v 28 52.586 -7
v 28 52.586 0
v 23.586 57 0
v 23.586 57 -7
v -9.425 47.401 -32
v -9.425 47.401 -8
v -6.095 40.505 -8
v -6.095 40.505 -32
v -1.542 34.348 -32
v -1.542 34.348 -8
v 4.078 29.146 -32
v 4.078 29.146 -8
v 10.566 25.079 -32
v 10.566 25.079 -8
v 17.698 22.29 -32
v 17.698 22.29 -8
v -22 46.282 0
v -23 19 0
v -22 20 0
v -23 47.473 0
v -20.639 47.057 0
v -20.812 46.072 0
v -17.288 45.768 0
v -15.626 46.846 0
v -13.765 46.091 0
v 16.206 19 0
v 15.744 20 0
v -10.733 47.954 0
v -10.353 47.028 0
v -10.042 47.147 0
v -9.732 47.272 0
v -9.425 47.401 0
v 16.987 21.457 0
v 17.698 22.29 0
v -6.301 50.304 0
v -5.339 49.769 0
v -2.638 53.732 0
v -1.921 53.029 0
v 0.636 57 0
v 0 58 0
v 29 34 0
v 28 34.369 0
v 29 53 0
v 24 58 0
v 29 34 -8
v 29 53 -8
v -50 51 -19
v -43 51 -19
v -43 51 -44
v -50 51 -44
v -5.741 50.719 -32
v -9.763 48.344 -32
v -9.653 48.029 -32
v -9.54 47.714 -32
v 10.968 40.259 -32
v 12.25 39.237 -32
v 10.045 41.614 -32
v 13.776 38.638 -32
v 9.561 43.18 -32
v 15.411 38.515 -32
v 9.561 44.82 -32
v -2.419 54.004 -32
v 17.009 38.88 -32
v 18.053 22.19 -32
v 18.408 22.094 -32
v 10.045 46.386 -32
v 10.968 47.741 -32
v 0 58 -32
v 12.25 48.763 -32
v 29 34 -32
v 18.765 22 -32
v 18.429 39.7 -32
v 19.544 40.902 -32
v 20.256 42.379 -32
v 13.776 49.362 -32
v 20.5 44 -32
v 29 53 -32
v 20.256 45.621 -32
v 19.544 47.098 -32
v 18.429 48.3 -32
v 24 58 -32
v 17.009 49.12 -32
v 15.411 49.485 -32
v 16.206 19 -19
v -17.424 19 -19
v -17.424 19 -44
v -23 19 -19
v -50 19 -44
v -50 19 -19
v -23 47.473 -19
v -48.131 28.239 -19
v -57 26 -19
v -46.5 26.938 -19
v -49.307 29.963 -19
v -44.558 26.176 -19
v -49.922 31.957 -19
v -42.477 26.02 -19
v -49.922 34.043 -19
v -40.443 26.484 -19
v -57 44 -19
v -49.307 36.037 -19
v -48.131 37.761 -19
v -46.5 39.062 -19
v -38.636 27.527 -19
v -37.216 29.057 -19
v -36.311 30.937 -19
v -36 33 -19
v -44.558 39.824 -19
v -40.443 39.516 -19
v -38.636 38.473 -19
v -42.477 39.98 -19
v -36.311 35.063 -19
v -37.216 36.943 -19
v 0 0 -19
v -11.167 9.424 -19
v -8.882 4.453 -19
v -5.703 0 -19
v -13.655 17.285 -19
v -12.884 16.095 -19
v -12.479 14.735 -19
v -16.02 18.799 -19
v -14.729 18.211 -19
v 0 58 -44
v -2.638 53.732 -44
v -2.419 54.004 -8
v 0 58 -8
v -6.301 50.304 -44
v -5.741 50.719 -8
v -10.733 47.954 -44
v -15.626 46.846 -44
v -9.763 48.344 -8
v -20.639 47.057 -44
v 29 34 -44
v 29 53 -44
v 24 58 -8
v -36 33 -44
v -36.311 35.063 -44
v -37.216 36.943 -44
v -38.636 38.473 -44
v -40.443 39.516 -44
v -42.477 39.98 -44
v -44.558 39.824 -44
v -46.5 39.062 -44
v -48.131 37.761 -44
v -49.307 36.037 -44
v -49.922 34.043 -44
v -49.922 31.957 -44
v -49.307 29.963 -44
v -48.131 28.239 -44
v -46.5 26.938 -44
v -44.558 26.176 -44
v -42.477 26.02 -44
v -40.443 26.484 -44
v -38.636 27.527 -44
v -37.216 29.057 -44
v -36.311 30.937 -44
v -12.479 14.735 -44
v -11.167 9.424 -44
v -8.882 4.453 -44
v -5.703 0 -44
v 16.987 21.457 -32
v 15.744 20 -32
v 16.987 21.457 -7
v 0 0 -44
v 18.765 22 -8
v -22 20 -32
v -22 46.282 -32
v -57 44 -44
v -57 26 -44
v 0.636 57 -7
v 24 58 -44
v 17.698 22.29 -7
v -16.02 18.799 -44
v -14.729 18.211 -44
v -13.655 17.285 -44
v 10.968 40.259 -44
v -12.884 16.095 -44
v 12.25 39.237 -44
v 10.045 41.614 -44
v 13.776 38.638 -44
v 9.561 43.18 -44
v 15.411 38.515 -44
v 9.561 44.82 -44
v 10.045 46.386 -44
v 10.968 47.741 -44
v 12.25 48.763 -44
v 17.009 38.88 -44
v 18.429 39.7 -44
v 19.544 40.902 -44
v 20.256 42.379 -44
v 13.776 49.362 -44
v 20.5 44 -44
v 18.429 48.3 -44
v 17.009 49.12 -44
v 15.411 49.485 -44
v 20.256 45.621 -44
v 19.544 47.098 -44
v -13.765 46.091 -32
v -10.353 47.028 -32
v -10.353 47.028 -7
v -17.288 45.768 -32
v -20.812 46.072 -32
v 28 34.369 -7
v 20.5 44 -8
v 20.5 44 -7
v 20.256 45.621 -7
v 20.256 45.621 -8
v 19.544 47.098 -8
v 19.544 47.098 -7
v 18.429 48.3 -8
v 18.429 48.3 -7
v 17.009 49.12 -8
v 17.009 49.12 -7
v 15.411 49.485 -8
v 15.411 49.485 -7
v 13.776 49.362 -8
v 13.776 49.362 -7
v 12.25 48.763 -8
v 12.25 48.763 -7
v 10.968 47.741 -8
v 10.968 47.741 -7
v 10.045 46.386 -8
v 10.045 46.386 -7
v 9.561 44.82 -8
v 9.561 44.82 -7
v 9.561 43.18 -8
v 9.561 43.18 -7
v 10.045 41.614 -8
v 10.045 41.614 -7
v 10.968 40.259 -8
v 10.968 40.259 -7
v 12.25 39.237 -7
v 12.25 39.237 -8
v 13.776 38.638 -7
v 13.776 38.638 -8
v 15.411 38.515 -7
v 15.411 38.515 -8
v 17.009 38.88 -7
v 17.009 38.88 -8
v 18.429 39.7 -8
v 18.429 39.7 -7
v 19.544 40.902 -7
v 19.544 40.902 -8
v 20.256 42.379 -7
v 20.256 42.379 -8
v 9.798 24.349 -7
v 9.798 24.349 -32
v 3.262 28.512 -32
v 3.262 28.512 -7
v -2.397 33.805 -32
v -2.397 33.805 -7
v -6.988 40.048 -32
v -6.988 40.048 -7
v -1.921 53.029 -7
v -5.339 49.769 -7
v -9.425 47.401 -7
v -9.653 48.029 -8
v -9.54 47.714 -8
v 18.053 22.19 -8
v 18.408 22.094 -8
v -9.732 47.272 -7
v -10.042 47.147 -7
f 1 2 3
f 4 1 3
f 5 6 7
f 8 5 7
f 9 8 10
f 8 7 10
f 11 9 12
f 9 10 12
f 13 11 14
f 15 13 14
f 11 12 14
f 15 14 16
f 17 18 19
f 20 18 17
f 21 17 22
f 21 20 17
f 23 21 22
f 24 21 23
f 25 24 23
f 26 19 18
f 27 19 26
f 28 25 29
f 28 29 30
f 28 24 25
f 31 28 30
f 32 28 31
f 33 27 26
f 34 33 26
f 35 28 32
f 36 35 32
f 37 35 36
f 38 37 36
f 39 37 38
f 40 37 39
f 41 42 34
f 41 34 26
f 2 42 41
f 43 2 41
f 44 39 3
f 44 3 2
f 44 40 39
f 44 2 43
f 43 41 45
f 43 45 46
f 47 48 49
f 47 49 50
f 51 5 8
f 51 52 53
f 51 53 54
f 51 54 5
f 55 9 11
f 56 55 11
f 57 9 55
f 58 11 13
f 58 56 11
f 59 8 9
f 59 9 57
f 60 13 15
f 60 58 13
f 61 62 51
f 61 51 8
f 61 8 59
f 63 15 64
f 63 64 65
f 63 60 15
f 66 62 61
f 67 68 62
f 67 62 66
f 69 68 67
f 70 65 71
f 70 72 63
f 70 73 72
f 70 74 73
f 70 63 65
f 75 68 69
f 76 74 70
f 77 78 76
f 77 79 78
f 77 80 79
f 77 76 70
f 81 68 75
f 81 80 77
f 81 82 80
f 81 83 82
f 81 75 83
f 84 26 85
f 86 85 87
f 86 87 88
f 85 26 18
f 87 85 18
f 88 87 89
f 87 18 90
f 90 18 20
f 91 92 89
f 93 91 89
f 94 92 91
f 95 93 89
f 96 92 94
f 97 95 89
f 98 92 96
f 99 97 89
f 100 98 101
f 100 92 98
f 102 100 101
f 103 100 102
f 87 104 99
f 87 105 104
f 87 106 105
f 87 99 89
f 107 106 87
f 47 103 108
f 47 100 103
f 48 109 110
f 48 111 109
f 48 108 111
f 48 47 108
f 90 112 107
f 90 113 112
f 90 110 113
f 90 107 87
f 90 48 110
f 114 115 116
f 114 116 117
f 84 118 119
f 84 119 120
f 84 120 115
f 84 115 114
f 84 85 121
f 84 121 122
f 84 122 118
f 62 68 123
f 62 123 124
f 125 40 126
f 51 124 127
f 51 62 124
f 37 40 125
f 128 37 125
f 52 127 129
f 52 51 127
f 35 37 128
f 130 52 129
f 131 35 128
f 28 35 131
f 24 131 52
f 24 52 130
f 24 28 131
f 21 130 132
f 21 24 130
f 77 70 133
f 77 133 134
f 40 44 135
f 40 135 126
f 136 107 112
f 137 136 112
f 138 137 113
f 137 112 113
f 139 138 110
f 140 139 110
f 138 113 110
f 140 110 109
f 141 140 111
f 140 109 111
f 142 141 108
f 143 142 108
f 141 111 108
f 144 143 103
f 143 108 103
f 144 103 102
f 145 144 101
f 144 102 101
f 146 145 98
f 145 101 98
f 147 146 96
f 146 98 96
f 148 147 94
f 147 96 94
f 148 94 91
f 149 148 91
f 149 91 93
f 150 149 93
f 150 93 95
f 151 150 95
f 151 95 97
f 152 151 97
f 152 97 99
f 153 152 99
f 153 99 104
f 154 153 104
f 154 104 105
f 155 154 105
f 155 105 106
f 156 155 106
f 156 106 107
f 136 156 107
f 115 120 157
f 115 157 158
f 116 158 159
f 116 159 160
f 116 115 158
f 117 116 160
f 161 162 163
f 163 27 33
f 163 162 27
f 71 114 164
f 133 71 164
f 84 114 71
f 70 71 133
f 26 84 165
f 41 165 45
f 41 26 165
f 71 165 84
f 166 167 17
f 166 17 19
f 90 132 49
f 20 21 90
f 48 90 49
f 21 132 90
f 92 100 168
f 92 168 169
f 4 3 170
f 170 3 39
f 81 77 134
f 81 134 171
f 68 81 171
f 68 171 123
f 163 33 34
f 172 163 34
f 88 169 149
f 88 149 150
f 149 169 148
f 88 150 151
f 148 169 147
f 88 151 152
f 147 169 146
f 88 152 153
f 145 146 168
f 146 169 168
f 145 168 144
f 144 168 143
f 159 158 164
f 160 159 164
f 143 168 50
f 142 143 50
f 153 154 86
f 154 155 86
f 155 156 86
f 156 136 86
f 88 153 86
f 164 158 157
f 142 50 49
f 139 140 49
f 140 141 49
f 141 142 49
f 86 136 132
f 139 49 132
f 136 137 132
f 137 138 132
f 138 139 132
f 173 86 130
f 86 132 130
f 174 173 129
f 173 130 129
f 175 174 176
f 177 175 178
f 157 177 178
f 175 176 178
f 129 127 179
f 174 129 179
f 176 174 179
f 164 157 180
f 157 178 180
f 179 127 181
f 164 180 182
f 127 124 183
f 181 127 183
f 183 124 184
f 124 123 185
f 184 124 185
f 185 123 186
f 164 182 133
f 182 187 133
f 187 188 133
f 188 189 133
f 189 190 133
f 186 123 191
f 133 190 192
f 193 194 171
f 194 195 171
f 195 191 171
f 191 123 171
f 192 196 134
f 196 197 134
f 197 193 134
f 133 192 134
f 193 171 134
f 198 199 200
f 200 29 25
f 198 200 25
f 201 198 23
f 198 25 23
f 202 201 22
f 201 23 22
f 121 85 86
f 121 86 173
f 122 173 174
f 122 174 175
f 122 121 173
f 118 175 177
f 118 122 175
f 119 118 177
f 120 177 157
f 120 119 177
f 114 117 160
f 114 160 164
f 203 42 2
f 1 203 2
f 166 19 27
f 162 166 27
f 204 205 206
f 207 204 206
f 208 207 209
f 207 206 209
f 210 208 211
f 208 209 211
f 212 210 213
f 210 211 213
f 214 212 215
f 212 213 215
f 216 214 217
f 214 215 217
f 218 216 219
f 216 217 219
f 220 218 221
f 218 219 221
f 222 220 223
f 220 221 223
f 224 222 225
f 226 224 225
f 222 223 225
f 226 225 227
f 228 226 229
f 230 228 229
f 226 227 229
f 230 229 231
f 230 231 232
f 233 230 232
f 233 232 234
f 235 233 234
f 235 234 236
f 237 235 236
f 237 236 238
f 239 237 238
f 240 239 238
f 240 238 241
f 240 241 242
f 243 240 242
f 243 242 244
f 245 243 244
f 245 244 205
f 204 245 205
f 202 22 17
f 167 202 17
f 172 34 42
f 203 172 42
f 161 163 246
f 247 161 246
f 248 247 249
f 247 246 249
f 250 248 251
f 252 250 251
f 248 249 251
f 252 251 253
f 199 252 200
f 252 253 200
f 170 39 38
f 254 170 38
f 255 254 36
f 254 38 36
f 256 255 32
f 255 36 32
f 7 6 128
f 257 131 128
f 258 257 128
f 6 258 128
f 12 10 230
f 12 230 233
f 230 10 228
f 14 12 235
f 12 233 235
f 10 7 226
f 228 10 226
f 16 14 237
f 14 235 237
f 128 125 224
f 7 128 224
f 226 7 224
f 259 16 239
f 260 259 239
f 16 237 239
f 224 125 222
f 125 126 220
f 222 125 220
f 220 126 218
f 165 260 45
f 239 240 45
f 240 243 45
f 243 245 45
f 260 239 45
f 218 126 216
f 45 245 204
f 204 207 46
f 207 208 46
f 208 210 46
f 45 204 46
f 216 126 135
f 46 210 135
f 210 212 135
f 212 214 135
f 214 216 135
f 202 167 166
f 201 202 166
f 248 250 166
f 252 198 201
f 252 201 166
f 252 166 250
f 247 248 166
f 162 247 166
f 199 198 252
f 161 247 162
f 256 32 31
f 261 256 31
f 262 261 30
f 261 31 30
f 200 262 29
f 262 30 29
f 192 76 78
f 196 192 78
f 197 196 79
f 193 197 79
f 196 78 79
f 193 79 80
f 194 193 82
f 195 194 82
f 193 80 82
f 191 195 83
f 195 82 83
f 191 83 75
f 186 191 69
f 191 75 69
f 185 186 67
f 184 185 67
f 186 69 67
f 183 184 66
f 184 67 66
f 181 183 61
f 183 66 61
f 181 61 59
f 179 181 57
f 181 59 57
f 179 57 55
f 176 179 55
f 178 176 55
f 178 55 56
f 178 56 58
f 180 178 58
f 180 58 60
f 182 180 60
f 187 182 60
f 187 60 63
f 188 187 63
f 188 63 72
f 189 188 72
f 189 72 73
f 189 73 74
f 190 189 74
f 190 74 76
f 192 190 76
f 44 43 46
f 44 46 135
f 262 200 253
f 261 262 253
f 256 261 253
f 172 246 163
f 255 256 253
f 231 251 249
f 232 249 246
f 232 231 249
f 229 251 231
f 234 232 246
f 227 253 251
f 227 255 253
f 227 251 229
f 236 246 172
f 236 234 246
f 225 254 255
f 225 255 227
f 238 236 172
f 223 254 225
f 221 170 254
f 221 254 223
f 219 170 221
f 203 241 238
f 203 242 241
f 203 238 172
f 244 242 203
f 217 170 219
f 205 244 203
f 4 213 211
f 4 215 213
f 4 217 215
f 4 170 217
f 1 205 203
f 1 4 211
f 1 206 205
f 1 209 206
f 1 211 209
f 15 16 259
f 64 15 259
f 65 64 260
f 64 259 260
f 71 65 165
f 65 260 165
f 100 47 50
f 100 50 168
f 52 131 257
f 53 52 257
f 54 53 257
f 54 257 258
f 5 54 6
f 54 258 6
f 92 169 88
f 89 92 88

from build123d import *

# Parameters (mm, degrees)
ESQUISSE1_R             = 7
BOSS_EXTRU_1_DEPTH      = 44
ESQUISSE1_4_R           = 7
ENL_V_MAT_EXTRU_1_DEPTH = 19
ENL_V_START             = -8
ESQUISSE1_5_R           = 5.5
ENL_V_MAT_EXTRU_2_DEPTH = 24
ESQUISSE1_7_R           = 5.5
ENL_V_MAT_EXTRU_3_DEPTH = 93.460802506
ENL_V_MAT_EXTRU_4_DEPTH = 32
ESQUISSE1_12_R          = 5.5
ENL_V_MAT_EXTRU_5_DEPTH = 7


with BuildPart() as part:
    # Esquisse1 → Boss.-Extru.1 (new body)
    with BuildSketch(Plane.XY):
        with BuildLine():
            Line((0, 0), (29, 34))
            Line((29, 34), (29, 53))
            Line((29, 53), (24, 58))
            Line((24, 58), (0, 58))
            ThreePointArc((0, 58), (-8.438901294, 48.982044142), (-20.638619164, 47.057085233))
            Line((-20.638619164, 47.057085233), (-43, 51))
            Line((-43, 51), (-50, 51))
            Line((-50, 51), (-57, 44))
            Line((-57, 44), (-57, 26))
            Line((-57, 26), (-50, 19))
            Line((-50, 19), (-17.424461089, 19))
            ThreePointArc((-17.424461089, 19), (-14.159225308, 17.786586232), (-12.478822347, 14.735294118))
            ThreePointArc((-12.478822347, 14.735294118), (-10.141992144, 6.884327939), (-5.703019947, 0))
            Line((-5.703019947, 0), (0, 0))
        make_face()
        with Locations((-43, 33)):
            Circle(ESQUISSE1_R, mode=Mode.SUBTRACT)
    extrude(amount=-BOSS_EXTRU_1_DEPTH)

    # Esquisse1_4 → Enl_v. mat.-Extru.1 (cut)
    # profile 1 of 2: a face of its own
    with BuildSketch(Plane.XY):
        with BuildLine():
            Line((-5.703019947, 0), (0, 0))
            Line((0, 0), (16.205882353, 19))
            Line((16.205882353, 19), (-17.424461089, 19))
            ThreePointArc((-17.424461089, 19), (-14.159225308, 17.786586232), (-12.478822347, 14.735294118))
            ThreePointArc((-12.478822347, 14.735294118), (-10.141992144, 6.884327939), (-5.703019947, 0))
        make_face()
    # profile 2 of 2: a face of its own
    with BuildSketch(Plane.XY):
        Polygon((-50, 19), (-23, 19), (-23, 47.473460386), (-43, 51), (-50, 51), (-57, 44), (-57, 26), align=None)
        with Locations((-43, 33)):
            Circle(ESQUISSE1_4_R, mode=Mode.SUBTRACT)
    extrude(amount=-ENL_V_MAT_EXTRU_1_DEPTH, mode=Mode.SUBTRACT)

    # Esquisse1_5 → Enl_v. mat.-Extru.2 (cut)
    with BuildSketch(Plane.XY.offset(ENL_V_START)):
        with BuildLine():
            Line((18.764705882, 22), (29, 34))
            Line((29, 34), (29, 53))
            Line((29, 53), (24, 58))
            Line((24, 58), (0, 58))
            ThreePointArc((0, 58), (-3.978755657, 52.259333621), (-9.763063451, 48.344294617))
            ThreePointArc((-9.763063451, 48.344294617), (1.184262982, 31.580705229), (18.764705882, 22))
        make_face()
        with Locations((15, 44)):
            Circle(ESQUISSE1_5_R, mode=Mode.SUBTRACT)
    extrude(amount=-ENL_V_MAT_EXTRU_2_DEPTH, mode=Mode.SUBTRACT)

    # Esquisse1_7 → Enl_v. mat.-Extru.3 (cut, through all)
    with BuildSketch(Plane.XY):
        with Locations((15, 44)):
            Circle(ESQUISSE1_7_R)
    extrude(amount=-ENL_V_MAT_EXTRU_3_DEPTH, mode=Mode.SUBTRACT)

    # Esquisse1_11 → Enl_v. mat.-Extru.4 (cut)
    with BuildSketch(Plane.XY):
        with BuildLine():
            Line((15.744476296, 20), (16.986847747, 21.456573425))
            ThreePointArc((16.986847747, 21.456573425), (0.310181683, 31.027872638), (-10.353317057, 47.028208705))
            ThreePointArc((-10.353317057, 47.028208705), (-15.518923584, 45.851449437), (-20.812267342, 46.07227748))
            Line((-20.812267342, 46.07227748), (-22, 46.281706793))
            Line((-22, 46.281706793), (-22, 20))
            Line((-22, 20), (-17.424461089, 20))
            Line((-17.424461089, 20), (15.744476296, 20))
        make_face()
    extrude(amount=-ENL_V_MAT_EXTRU_4_DEPTH, mode=Mode.SUBTRACT)

    # Esquisse1_12 → Enl_v. mat.-Extru.5 (cut)
    with BuildSketch(Plane.XY):
        with BuildLine():
            ThreePointArc((0.636084685, 57), (-3.899559801, 50.957177308), (-10.353317057, 47.028208705))
            ThreePointArc((-10.353317057, 47.028208705), (0.310181683, 31.027872638), (16.986847747, 21.456573425))
            Line((16.986847747, 21.456573425), (28, 34.368545033))
            Line((28, 34.368545033), (28, 52.585786438))
            Line((28, 52.585786438), (23.585786438, 57))
            Line((23.585786438, 57), (0.636084685, 57))
        make_face()
        with Locations((15, 44)):
            Circle(ESQUISSE1_12_R, mode=Mode.SUBTRACT)
    extrude(amount=-ENL_V_MAT_EXTRU_5_DEPTH, mode=Mode.SUBTRACT)


solid = part.part
